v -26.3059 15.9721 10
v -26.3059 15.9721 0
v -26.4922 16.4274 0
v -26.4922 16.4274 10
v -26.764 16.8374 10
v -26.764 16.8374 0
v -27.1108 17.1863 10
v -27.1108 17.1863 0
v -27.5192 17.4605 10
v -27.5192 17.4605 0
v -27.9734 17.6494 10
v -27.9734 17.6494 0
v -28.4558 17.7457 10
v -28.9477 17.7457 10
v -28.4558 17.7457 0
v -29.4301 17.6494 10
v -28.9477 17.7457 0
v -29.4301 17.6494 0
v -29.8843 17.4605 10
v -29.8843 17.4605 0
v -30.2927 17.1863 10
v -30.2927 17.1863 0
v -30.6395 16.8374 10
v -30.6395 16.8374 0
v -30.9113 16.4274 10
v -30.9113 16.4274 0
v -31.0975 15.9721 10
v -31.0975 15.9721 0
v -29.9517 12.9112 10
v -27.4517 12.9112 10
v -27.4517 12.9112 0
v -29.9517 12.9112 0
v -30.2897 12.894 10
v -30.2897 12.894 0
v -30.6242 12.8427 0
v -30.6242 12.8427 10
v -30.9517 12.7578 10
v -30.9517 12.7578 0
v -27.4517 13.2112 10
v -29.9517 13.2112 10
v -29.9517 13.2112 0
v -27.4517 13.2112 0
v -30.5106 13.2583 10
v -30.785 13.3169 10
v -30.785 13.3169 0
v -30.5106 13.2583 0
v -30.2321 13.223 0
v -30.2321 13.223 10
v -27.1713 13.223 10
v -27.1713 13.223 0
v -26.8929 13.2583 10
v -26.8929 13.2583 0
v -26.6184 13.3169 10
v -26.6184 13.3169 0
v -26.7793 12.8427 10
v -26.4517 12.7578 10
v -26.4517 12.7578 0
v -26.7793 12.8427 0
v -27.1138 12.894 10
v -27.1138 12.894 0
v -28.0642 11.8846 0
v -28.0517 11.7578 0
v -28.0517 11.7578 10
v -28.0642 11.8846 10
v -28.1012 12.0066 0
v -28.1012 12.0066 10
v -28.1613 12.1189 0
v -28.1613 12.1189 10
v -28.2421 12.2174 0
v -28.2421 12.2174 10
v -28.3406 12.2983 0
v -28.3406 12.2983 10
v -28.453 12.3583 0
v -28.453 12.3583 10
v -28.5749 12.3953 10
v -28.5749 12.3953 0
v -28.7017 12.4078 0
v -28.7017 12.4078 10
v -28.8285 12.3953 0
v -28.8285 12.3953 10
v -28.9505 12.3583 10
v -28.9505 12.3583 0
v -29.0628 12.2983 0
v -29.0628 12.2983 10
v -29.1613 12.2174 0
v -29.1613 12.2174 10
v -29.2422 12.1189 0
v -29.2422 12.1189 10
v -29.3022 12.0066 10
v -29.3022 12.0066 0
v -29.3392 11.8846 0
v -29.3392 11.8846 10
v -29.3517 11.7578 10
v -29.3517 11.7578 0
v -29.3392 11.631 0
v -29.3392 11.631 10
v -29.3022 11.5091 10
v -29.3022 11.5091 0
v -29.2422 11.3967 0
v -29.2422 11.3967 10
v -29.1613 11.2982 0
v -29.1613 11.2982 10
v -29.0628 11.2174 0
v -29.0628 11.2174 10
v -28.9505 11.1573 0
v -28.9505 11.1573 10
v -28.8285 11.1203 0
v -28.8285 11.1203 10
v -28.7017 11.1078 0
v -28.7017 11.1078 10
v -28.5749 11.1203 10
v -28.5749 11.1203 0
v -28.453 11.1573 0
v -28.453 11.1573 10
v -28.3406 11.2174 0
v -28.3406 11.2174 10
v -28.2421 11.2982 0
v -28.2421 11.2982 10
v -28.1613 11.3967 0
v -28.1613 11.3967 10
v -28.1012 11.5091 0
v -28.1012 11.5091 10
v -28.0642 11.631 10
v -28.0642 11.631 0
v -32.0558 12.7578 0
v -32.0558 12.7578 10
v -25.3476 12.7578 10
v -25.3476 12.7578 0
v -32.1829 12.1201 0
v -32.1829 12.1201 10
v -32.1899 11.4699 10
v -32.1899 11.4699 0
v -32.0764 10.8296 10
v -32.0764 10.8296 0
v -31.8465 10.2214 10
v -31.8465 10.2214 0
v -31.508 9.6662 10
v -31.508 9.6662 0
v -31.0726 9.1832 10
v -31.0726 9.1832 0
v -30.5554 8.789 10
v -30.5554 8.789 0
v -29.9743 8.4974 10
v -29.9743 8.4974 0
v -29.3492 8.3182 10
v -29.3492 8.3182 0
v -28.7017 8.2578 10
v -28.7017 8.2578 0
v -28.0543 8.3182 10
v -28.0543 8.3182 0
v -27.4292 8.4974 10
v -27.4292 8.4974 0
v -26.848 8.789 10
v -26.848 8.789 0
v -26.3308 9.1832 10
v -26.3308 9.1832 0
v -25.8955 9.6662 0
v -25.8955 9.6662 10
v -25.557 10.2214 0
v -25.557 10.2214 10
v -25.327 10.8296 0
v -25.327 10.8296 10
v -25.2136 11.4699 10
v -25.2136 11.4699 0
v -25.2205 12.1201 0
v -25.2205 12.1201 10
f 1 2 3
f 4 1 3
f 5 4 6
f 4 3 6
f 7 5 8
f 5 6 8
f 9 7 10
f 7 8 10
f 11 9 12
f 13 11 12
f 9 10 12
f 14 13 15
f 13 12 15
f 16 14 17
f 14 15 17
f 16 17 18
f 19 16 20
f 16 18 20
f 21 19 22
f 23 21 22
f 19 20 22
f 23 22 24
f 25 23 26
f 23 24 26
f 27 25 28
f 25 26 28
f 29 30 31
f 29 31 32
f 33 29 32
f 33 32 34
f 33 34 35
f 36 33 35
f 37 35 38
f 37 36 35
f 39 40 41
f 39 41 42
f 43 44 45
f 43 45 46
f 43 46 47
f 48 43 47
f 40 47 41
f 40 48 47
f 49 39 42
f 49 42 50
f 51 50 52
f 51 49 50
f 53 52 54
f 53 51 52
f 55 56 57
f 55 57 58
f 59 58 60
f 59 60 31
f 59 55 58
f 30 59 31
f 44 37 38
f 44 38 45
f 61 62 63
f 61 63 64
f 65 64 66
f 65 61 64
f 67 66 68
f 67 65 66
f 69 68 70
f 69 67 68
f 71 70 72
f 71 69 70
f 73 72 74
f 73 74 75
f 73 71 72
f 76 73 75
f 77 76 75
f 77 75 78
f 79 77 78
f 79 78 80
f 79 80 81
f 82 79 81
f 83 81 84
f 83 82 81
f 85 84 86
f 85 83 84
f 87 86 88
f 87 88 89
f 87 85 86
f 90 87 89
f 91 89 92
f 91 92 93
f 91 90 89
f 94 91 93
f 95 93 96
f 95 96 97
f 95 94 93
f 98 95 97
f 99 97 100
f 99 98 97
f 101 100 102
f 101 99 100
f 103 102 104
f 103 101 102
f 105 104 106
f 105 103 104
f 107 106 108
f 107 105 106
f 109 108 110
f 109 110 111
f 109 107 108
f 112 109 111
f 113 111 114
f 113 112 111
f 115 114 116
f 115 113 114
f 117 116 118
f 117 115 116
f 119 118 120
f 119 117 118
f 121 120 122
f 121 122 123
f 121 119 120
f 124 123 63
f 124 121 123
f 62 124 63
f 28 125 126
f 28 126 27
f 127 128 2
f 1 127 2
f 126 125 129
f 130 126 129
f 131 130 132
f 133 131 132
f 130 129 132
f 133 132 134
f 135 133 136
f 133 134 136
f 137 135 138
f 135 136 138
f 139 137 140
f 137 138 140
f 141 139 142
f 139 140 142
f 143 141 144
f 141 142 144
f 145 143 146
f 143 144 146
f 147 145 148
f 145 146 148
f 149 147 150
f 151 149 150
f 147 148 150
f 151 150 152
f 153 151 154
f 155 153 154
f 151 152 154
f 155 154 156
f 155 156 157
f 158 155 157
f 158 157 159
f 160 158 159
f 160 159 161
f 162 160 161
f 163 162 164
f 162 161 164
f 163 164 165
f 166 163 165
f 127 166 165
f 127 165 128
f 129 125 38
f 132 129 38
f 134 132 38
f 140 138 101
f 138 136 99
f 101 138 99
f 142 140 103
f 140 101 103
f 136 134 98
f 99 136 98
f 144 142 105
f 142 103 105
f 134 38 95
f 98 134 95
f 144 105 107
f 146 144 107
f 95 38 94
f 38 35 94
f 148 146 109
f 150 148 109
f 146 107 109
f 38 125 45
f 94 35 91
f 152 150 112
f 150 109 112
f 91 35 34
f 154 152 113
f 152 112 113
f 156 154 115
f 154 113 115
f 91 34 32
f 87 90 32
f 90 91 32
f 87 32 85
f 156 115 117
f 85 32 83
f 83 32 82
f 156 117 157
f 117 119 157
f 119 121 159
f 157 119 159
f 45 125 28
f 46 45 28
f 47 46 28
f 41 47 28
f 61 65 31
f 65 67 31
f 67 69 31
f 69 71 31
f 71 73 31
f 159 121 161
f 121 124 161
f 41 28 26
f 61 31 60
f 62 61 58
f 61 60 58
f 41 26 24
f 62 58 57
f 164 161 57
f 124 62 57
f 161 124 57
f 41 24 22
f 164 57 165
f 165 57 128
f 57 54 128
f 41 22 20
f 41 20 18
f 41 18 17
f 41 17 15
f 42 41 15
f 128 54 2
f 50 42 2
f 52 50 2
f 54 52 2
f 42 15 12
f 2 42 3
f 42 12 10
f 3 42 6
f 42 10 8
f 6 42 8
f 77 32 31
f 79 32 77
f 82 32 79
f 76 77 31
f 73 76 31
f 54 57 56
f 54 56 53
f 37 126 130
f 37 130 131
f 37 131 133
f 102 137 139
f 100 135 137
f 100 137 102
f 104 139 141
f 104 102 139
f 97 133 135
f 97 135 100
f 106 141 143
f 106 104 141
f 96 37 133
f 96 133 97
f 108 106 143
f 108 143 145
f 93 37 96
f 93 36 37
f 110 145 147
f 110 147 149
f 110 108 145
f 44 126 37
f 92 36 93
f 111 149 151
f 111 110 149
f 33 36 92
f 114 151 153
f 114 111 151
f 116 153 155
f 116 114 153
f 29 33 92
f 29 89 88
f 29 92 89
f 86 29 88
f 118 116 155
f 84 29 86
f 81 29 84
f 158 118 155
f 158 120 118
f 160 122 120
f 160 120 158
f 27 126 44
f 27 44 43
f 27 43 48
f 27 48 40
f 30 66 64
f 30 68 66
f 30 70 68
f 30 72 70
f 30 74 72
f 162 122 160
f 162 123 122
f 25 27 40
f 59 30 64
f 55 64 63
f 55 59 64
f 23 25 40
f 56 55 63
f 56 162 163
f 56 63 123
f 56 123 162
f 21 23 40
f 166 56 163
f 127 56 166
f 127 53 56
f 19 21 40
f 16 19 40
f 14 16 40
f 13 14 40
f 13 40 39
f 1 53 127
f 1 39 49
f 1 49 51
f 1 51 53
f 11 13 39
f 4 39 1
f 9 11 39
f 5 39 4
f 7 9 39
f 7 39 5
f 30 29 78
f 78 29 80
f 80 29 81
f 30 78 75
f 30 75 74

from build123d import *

# Parameters (mm, degrees)
SKETCH_R     = 0.65
PAD_DEPTH    = 10
POCKET_DEPTH = 10.001


with BuildPart() as part:
    # Sketch → Pad (new body)
    with BuildSketch(Plane.XY):
        with BuildLine():
            ThreePointArc((-32.05582, 12.757822), (-28.701718, 8.257822), (-25.347616, 12.757822))
            Line((-25.347616, 12.757822), (-26.305931, 15.972107))
            ThreePointArc((-26.305931, 15.972107), (-28.701718, 17.757822), (-31.097506, 15.972107))
            Line((-32.05582, 12.757822), (-31.097506, 15.972107))
        make_face()
        with Locations((-28.701718, 11.757822)):
            Circle(SKETCH_R, mode=Mode.SUBTRACT)
    extrude(amount=PAD_DEPTH)

    # Sketch001 (on Face7 of Pad) → Pocket (cut, through all)
    with BuildSketch(Plane.XY.offset(10)):
        with BuildLine():
            ThreePointArc((-30.785044, 13.316866), (-30.37172, 13.23769), (-29.951718, 13.211157))
            Line((-29.951718, 13.211157), (-27.451718, 13.211157))
            ThreePointArc((-27.451718, 13.211157), (-27.031717, 13.23769), (-26.618393, 13.316866))
            Line((-26.451718, 12.757822), (-26.618393, 13.316866))
            ThreePointArc((-26.451718, 12.757822), (-26.945875, 12.8726), (-27.451718, 12.911157))
            Line((-27.451718, 12.911157), (-29.951718, 12.911157))
            ThreePointArc((-29.951718, 12.911157), (-30.457562, 12.8726), (-30.951718, 12.757822))
            Line((-30.951718, 12.757822), (-30.785044, 13.316866))
        make_face()
    extrude(amount=-POCKET_DEPTH, mode=Mode.SUBTRACT)


solid = part.part
